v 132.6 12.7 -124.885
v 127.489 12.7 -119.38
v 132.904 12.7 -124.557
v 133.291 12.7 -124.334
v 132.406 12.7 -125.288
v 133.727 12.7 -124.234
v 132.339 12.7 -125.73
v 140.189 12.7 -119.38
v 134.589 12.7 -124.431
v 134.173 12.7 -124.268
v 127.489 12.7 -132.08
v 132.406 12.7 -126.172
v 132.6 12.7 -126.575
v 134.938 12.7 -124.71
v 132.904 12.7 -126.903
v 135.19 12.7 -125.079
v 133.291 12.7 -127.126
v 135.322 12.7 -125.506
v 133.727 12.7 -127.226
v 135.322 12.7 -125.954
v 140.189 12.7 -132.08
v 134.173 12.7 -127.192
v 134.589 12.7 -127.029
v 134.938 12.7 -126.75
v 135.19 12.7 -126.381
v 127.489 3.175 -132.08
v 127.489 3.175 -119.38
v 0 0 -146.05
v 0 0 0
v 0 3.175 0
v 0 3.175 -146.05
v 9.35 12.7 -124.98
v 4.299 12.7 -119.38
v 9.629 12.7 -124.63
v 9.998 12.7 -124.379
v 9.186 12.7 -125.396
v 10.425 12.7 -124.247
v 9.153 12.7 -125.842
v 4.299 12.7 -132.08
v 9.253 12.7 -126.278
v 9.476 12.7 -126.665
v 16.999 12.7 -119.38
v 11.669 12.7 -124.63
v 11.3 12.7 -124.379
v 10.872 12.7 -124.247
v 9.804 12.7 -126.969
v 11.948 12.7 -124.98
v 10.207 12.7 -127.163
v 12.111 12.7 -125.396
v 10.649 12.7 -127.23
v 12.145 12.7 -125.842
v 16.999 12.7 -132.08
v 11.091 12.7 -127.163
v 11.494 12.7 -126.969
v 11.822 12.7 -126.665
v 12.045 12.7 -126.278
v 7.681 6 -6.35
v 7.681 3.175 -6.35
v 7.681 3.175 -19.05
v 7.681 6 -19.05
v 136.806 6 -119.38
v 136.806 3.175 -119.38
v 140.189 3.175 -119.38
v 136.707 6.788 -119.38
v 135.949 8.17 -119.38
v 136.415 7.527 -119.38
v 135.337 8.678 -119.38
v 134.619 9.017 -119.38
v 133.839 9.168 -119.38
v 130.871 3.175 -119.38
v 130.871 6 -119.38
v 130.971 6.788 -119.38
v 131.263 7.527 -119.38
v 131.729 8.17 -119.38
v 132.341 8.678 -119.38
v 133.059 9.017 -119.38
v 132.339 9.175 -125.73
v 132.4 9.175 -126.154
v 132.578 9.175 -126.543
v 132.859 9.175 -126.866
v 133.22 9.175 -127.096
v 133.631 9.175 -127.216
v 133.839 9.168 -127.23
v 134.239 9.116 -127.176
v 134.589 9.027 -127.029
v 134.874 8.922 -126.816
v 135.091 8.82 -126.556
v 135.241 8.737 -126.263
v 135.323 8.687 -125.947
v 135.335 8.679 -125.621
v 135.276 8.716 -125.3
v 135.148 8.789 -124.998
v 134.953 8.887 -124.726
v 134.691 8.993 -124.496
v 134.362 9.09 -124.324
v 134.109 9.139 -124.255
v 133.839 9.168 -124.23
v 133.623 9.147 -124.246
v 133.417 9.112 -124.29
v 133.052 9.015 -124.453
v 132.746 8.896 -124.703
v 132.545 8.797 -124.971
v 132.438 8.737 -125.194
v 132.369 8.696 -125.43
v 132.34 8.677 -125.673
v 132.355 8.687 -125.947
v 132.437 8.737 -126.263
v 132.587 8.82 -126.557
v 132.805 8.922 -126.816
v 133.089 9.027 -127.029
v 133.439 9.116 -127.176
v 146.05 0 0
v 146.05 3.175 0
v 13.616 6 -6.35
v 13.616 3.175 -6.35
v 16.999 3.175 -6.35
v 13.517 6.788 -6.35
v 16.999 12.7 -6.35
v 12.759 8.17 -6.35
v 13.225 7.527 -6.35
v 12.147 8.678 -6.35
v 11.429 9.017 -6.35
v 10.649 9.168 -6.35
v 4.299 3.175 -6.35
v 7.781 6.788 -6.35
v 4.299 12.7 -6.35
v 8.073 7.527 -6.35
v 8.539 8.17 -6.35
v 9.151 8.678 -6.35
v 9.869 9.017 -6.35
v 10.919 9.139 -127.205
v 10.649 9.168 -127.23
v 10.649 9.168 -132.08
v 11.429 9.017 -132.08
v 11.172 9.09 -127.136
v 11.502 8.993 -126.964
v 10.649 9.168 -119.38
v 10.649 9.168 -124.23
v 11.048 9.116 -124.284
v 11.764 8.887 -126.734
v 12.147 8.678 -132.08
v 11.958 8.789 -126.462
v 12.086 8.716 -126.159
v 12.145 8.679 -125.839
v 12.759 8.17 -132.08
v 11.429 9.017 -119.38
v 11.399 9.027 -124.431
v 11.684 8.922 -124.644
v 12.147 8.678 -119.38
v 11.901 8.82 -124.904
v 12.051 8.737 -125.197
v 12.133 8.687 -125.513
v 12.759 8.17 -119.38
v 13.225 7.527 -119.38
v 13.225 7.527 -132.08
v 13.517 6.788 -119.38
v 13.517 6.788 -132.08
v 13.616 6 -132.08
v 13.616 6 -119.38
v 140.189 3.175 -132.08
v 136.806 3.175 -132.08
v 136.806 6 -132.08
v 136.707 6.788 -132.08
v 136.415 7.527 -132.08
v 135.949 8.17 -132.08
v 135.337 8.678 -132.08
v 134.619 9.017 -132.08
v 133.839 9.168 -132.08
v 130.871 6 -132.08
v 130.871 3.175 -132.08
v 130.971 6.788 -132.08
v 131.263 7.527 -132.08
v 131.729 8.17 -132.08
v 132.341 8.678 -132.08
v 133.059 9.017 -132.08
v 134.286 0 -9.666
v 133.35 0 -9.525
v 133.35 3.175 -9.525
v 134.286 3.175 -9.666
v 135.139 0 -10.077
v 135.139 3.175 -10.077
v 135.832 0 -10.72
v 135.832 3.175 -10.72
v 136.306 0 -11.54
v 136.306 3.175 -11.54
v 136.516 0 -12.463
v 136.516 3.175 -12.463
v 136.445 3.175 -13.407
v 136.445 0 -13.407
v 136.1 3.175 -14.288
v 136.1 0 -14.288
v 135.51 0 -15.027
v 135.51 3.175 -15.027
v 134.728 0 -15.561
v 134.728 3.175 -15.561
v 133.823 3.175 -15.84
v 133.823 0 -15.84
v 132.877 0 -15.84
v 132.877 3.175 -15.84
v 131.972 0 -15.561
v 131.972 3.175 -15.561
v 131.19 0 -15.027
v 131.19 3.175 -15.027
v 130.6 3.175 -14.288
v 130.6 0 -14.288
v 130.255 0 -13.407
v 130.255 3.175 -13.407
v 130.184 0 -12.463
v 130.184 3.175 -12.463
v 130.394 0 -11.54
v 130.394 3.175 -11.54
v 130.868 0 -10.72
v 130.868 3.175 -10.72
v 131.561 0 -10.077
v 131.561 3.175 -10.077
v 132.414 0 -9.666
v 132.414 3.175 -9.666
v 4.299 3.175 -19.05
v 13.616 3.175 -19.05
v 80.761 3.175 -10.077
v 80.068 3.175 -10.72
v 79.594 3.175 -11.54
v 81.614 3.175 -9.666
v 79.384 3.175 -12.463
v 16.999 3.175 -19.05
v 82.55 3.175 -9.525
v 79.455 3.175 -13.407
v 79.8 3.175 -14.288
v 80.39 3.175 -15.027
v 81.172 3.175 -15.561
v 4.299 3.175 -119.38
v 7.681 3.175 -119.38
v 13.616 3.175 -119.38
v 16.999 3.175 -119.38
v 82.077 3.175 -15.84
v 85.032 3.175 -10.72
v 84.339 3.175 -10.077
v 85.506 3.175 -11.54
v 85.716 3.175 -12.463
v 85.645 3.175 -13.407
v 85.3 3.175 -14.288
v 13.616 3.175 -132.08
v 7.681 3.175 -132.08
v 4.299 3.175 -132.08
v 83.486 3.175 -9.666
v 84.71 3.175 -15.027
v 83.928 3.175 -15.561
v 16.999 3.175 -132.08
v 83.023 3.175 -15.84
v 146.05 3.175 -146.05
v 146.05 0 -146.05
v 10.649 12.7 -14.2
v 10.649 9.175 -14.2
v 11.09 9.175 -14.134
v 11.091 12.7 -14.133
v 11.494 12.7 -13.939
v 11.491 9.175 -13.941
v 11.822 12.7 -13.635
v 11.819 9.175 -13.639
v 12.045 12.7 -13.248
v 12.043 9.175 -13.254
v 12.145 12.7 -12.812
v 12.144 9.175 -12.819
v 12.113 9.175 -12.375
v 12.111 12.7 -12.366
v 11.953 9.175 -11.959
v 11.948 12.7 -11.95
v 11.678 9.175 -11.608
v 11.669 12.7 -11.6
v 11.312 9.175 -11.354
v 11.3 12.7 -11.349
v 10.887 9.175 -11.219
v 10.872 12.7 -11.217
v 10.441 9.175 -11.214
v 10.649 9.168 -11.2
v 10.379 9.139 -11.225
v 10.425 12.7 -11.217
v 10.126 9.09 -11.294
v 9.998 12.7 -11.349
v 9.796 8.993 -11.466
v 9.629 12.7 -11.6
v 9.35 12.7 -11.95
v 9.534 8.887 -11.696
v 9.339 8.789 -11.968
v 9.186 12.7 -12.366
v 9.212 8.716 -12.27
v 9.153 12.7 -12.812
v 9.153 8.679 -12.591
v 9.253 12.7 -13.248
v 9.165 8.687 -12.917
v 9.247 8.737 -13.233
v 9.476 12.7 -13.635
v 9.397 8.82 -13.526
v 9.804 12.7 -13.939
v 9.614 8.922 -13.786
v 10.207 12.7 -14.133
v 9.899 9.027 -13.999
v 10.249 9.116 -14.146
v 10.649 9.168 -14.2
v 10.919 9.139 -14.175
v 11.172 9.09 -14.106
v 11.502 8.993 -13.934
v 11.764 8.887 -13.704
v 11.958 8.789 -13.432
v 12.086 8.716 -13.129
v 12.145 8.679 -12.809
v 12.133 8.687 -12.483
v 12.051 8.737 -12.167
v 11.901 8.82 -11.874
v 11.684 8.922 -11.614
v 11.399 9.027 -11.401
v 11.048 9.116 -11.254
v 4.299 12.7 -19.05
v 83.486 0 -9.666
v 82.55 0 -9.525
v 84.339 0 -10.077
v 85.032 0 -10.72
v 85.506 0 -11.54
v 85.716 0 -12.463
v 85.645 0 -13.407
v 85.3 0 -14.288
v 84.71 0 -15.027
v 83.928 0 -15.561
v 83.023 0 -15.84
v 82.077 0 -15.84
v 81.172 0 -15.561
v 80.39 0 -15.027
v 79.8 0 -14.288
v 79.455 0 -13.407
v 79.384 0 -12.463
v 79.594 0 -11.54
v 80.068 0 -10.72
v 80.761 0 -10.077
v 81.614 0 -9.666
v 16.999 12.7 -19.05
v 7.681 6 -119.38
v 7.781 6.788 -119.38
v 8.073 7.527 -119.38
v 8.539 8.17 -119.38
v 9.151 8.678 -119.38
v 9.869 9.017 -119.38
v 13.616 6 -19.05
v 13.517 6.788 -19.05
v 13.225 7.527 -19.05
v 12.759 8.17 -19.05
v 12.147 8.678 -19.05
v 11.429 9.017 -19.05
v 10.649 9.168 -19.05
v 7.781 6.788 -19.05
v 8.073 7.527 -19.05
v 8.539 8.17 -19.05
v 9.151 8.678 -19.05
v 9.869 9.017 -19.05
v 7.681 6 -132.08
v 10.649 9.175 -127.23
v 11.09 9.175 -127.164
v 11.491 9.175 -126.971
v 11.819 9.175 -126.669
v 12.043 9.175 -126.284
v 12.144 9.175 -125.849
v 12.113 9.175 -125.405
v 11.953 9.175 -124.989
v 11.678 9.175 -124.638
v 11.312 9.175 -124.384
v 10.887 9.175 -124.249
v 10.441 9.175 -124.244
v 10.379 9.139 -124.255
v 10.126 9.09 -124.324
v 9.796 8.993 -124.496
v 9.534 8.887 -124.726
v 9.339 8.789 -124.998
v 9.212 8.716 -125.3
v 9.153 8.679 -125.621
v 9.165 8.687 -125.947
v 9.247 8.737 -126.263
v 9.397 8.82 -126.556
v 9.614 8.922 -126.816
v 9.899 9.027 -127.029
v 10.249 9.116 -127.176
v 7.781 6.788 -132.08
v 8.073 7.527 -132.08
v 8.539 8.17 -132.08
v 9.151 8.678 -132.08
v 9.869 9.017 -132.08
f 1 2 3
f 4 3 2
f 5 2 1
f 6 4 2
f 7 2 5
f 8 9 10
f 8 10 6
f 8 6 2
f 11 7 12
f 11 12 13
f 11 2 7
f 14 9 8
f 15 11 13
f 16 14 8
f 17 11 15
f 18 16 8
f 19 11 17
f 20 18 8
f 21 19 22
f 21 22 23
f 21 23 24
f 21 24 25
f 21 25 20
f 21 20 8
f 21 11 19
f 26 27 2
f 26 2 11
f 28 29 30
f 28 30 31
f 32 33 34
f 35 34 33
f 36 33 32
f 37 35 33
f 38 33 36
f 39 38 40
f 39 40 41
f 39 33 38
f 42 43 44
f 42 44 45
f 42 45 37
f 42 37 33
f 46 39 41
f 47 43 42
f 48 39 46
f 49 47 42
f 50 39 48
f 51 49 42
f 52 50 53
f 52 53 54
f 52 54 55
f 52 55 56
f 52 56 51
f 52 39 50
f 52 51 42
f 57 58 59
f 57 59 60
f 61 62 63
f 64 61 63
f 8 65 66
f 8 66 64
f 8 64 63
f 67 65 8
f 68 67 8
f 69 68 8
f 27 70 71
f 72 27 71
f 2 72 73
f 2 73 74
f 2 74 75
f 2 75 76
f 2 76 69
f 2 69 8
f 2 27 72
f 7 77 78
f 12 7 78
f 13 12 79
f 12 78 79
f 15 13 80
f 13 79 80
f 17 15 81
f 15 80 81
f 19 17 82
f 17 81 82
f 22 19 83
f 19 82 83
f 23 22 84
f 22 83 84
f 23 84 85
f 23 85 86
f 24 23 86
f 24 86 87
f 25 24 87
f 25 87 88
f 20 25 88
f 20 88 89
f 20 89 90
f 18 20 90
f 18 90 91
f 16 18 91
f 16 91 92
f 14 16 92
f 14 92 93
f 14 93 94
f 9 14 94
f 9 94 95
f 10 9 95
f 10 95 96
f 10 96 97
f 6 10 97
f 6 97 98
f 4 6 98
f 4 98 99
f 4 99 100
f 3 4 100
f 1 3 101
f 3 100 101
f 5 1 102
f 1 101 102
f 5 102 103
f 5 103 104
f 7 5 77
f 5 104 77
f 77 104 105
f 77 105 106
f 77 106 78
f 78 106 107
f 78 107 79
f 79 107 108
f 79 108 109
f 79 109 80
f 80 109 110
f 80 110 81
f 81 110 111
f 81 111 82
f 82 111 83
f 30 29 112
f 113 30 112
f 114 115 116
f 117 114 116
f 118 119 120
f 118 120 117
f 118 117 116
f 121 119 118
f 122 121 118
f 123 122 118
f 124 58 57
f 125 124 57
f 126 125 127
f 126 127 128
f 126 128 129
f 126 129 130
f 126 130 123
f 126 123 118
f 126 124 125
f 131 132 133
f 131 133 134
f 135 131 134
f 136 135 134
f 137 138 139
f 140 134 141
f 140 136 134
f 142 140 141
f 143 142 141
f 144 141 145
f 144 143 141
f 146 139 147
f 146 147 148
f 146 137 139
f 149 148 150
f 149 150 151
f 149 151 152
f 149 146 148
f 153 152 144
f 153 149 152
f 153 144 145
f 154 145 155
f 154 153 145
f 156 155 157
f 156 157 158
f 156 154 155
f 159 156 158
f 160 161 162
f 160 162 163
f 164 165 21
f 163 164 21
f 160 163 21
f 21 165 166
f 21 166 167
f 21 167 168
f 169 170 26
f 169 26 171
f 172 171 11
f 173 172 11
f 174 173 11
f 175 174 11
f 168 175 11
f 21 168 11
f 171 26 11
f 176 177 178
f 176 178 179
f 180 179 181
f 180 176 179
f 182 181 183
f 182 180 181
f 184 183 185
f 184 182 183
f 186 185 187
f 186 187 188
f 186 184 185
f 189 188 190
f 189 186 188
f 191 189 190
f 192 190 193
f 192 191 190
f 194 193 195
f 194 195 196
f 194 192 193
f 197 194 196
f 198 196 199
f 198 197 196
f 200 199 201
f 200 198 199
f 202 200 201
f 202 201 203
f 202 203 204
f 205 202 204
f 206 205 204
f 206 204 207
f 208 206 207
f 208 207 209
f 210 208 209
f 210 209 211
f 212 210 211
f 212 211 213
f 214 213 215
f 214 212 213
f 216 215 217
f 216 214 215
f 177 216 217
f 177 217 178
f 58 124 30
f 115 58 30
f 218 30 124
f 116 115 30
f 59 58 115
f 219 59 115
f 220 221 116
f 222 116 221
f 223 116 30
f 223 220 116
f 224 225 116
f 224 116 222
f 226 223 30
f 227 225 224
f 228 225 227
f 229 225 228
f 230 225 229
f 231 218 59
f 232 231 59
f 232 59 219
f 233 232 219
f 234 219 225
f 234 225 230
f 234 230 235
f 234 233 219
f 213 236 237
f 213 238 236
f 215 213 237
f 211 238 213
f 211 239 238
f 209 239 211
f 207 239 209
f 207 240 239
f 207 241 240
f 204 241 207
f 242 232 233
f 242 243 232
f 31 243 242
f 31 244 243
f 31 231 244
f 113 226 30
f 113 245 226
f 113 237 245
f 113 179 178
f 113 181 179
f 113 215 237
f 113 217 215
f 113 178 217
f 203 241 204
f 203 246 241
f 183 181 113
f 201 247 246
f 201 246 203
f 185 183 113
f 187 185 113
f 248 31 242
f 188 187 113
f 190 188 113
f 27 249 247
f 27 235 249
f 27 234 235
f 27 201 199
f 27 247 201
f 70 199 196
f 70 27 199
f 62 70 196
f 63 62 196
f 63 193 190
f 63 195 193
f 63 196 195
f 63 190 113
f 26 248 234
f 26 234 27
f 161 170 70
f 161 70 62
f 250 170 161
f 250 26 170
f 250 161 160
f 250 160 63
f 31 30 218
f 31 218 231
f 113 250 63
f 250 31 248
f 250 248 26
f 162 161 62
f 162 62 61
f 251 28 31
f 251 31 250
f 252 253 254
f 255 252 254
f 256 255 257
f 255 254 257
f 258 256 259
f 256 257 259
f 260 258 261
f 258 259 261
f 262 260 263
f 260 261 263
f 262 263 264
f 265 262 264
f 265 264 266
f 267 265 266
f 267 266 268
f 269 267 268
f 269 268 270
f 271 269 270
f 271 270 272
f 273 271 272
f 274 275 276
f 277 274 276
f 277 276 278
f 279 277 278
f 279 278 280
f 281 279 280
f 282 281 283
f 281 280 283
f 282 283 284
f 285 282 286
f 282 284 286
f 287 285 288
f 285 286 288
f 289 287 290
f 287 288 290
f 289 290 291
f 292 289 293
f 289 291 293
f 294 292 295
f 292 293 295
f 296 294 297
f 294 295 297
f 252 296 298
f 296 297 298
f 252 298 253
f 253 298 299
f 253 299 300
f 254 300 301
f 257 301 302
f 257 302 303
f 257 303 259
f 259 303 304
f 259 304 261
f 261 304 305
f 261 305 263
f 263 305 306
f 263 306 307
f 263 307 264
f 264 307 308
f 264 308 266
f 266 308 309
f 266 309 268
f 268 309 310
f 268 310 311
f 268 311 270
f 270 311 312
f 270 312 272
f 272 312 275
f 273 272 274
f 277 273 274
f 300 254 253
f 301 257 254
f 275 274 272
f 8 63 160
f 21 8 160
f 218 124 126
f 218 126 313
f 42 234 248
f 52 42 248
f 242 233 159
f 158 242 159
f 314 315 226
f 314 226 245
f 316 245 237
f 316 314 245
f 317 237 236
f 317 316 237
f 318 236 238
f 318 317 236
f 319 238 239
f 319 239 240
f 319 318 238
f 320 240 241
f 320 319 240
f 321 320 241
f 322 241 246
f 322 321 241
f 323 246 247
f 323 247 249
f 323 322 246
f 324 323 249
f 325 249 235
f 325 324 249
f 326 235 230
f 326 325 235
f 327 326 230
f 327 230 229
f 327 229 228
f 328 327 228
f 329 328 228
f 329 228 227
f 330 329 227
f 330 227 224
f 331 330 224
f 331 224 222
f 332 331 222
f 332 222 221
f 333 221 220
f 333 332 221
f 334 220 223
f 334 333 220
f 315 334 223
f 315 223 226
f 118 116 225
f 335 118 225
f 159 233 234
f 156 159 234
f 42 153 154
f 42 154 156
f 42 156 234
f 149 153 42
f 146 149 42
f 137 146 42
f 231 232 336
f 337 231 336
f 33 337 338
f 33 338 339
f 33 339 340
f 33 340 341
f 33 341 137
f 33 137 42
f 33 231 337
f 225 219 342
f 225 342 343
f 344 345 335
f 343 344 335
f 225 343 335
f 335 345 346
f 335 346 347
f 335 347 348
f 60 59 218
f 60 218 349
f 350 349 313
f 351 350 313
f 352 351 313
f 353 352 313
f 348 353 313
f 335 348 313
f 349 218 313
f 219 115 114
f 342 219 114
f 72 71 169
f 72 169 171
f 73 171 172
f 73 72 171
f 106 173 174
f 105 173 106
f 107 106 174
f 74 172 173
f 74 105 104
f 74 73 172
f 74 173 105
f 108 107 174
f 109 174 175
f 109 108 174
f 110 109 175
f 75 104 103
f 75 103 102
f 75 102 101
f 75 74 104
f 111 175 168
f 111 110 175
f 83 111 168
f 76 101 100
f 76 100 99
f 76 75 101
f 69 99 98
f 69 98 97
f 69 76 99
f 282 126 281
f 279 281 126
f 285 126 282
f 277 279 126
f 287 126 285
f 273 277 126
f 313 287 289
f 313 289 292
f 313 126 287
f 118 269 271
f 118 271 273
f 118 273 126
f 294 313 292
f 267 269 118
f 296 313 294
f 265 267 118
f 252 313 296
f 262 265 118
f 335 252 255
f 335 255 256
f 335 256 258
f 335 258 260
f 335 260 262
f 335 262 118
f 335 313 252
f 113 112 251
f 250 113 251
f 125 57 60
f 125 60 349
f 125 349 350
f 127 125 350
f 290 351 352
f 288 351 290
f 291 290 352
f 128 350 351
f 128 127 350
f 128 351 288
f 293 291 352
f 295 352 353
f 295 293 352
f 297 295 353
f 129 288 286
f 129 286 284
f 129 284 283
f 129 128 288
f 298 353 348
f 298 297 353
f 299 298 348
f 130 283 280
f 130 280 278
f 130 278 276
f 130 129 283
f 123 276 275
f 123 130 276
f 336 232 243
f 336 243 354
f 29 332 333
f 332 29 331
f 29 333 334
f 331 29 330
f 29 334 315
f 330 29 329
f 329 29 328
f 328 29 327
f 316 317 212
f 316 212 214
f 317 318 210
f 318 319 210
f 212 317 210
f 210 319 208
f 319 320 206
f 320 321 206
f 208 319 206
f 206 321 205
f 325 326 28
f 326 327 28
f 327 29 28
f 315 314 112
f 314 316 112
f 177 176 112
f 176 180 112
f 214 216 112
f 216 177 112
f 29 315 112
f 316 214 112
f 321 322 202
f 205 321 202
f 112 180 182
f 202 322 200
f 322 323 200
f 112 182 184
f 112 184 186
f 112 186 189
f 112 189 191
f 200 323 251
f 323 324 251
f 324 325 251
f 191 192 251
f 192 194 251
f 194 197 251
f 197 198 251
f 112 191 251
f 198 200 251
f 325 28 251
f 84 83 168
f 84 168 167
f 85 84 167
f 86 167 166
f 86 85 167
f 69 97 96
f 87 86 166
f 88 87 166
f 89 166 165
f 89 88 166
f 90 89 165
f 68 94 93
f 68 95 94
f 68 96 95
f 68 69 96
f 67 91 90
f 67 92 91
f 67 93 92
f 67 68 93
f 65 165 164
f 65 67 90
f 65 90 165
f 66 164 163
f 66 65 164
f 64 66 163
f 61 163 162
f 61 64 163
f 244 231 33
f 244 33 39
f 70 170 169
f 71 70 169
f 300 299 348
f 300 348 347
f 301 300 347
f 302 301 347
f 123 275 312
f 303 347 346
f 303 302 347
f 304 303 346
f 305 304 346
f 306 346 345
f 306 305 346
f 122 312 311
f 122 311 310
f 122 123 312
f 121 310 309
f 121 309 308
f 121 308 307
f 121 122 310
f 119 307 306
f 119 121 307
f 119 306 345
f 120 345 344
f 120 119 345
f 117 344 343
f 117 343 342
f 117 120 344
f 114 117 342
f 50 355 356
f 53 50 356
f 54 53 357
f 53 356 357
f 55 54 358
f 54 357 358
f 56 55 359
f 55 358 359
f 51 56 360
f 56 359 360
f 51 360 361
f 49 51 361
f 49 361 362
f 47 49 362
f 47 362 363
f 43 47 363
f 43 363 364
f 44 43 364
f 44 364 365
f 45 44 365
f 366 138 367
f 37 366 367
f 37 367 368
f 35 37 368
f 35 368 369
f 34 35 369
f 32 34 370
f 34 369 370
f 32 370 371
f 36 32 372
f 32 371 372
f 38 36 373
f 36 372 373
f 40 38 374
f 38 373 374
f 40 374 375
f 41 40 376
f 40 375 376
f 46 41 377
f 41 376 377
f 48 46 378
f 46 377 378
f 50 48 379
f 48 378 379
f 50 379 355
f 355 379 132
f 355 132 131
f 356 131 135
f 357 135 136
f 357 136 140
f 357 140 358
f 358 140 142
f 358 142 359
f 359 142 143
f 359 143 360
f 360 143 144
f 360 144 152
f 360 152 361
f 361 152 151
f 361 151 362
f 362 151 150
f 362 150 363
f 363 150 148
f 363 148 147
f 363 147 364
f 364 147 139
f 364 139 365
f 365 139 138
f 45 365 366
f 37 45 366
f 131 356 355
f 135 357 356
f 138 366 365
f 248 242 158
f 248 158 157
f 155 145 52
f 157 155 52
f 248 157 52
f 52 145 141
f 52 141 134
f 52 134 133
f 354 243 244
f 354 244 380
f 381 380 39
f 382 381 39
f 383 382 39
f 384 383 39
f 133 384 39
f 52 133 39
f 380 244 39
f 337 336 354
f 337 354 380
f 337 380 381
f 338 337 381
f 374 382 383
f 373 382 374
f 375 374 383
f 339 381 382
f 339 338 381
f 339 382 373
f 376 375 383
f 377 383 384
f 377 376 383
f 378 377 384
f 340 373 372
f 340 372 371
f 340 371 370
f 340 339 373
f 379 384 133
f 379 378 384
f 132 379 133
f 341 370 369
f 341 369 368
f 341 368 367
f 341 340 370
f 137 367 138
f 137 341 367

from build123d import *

# Parameters (mm, degrees)
SKETCH1_W           = 146.05
SKETCH1_H           = 146.05
SKETCH1_R           = 3.175
BOSS_EXTRUDE1_DEPTH = 3.175
SKETCH4_W           = 12.7
SKETCH4_H           = 12.7
BOSS_EXTRUDE4_DEPTH = 9.525
SKETCH6_W           = 5.935
SKETCH6_H           = 6
CUT_EXTRUDE2_DEPTH  = 150
SKETCH7_W           = 5.935
SKETCH7_H           = 6
CUT_EXTRUDE3_DEPTH  = 15
SKETCH2_R           = 1.5
CUT_EXTRUDE4_DEPTH  = 15
FILLET2_R           = 3.175


with BuildPart() as part:
    # Sketch1 → Boss-Extrude1 (new body)
    with BuildSketch(Plane(origin=(0, 0, 0), x_dir=(1, 0, 0), z_dir=(0, 1, 0))):
        with Locations((73.025, 73.025)):
            Rectangle(SKETCH1_W, SKETCH1_H)
        with Locations(Location((133.35, 12.7, 0), (0, 0, 270))):
            Circle(SKETCH1_R, mode=Mode.SUBTRACT)
        with Locations(Location((82.55, 12.7, 0), (0, 0, 270))):
            Circle(SKETCH1_R, mode=Mode.SUBTRACT)
    extrude(amount=BOSS_EXTRUDE1_DEPTH)

    # Sketch4 → Boss-Extrude4 (add)
    with BuildSketch(Plane(origin=(0, 3.175, 0), x_dir=(1, 0, 0), z_dir=(0, 1, 0))):
        with Locations((10.648879027, 12.7)):
            Rectangle(SKETCH4_W, SKETCH4_H)
        with Locations((10.648879027, 125.73)):
            Rectangle(SKETCH4_W, SKETCH4_H)
        with Locations((133.838879027, 125.73)):
            Rectangle(SKETCH4_W, SKETCH4_H)
    extrude(amount=BOSS_EXTRUDE4_DEPTH)

    # Sketch6 → Cut-Extrude2 (cut)
    with BuildSketch(Plane.XY.offset(-6.35)):
        with Locations((10.648879027, 6.175)):
            Rectangle(SKETCH6_W, SKETCH6_H)
    extrude(amount=-CUT_EXTRUDE2_DEPTH, mode=Mode.SUBTRACT)

    # Sketch7 → Cut-Extrude3 (cut)
    with BuildSketch(Plane.XY.offset(-119.38)):
        with Locations((133.838879027, 6.175)):
            Rectangle(SKETCH7_W, SKETCH7_H)
    extrude(amount=-CUT_EXTRUDE3_DEPTH, mode=Mode.SUBTRACT)

    # Sketch2 → Cut-Extrude4 (cut)
    with BuildSketch(Plane(origin=(0, 3.175, 0), x_dir=(1, 0, 0), z_dir=(0, 1, 0))):
        with Locations(Location((10.648879027, 125.73, 0), (0, 0, 90))):
            Circle(SKETCH2_R)
        with Locations(Location((133.838879027, 125.73, 0), (0, 0, 180))):
            Circle(SKETCH2_R)
        with Locations(Location((10.648879027, 12.7, 0), (0, 0, 90))):
            Circle(SKETCH2_R)
    extrude(amount=CUT_EXTRUDE4_DEPTH, mode=Mode.SUBTRACT)

    # Fillet2
    # the kernel refuses this fillet: 3.175 mm, written as the material it adds along each edge
    with BuildSketch(Plane(origin=(136.806379027, 9.175, -119.38), x_dir=(0, -1, 0), z_dir=(0, 0, -1))) as fillet2_piece_1_section:
        with BuildLine():
            CenterArc((FILLET2_R, FILLET2_R), FILLET2_R, 180, 90)
            Line((0, FILLET2_R), (0, 0))
            Line((0, 0), (FILLET2_R, 0))
        make_face()
    fillet2_piece_1 = extrude(amount=12.7, mode=Mode.PRIVATE)
    fillet2_piece_1 = fillet2_piece_1 - Plane(origin=(133.838879027, 8.440537645, -125.73), x_dir=(-1, 0, 0), z_dir=(0, -1, 0)) * Cylinder(1.5, 39, mode=Mode.PRIVATE)
    add(fillet2_piece_1)
    with BuildSketch(Plane(origin=(130.871379027, 9.175, -119.38), x_dir=(0, -1, 0), z_dir=(0, 0, -1))) as fillet2_piece_2_section:
        with BuildLine():
            CenterArc((FILLET2_R, -FILLET2_R), FILLET2_R, 90, 90)
            Line((0, -FILLET2_R), (0, 0))
            Line((0, 0), (FILLET2_R, 0))
        make_face()
    fillet2_piece_2 = extrude(amount=12.7, mode=Mode.PRIVATE)
    fillet2_piece_2 = fillet2_piece_2 - Plane(origin=(133.838879027, 8.44053751, -125.73), x_dir=(-1, 0, 0), z_dir=(0, -1, 0)) * Cylinder(1.5, 39, mode=Mode.PRIVATE)
    add(fillet2_piece_2)
    with BuildSketch(Plane(origin=(13.616379027, 9.175, -119.38), x_dir=(0, -1, 0), z_dir=(0, 0, -1))) as fillet2_piece_3_section:
        with BuildLine():
            CenterArc((FILLET2_R, FILLET2_R), FILLET2_R, 180, 90)
            Line((0, FILLET2_R), (0, 0))
            Line((0, 0), (FILLET2_R, 0))
        make_face()
    fillet2_piece_3 = extrude(amount=12.7, mode=Mode.PRIVATE)
    fillet2_piece_3 = fillet2_piece_3 - Plane(origin=(10.648879027, 8.440537543, -125.73), x_dir=(0, 0, -1), z_dir=(0, -1, 0)) * Cylinder(1.5, 39, mode=Mode.PRIVATE)
    add(fillet2_piece_3)
    with BuildSketch(Plane(origin=(7.681379027, 9.175, -119.38), x_dir=(0, -1, 0), z_dir=(0, 0, -1))) as fillet2_piece_4_section:
        with BuildLine():
            CenterArc((FILLET2_R, -FILLET2_R), FILLET2_R, 90, 90)
            Line((0, -FILLET2_R), (0, 0))
            Line((0, 0), (FILLET2_R, 0))
        make_face()
    fillet2_piece_4 = extrude(amount=12.7, mode=Mode.PRIVATE)
    fillet2_piece_4 = fillet2_piece_4 - Plane(origin=(10.648879027, 8.440537622, -125.73), x_dir=(0, 0, -1), z_dir=(0, -1, 0)) * Cylinder(1.5, 39, mode=Mode.PRIVATE)
    add(fillet2_piece_4)
    with BuildSketch(Plane(origin=(13.616379027, 9.175, -6.35), x_dir=(0, -1, 0), z_dir=(0, 0, -1))) as fillet2_piece_5_section:
        with BuildLine():
            CenterArc((FILLET2_R, FILLET2_R), FILLET2_R, 180, 90)
            Line((0, FILLET2_R), (0, 0))
            Line((0, 0), (FILLET2_R, 0))
        make_face()
    fillet2_piece_5 = extrude(amount=12.7, mode=Mode.PRIVATE)
    fillet2_piece_5 = fillet2_piece_5 - Plane(origin=(10.648879027, 8.440537543, -12.7), x_dir=(0, 0, -1), z_dir=(0, -1, 0)) * Cylinder(1.5, 39, mode=Mode.PRIVATE)
    add(fillet2_piece_5)
    with BuildSketch(Plane(origin=(7.681379027, 9.175, -6.35), x_dir=(0, -1, 0), z_dir=(0, 0, -1))) as fillet2_piece_6_section:
        with BuildLine():
            CenterArc((FILLET2_R, -FILLET2_R), FILLET2_R, 90, 90)
            Line((0, -FILLET2_R), (0, 0))
            Line((0, 0), (FILLET2_R, 0))
        make_face()
    fillet2_piece_6 = extrude(amount=12.7, mode=Mode.PRIVATE)
    fillet2_piece_6 = fillet2_piece_6 - Plane(origin=(10.648879027, 8.440537622, -12.7), x_dir=(0, 0, -1), z_dir=(0, -1, 0)) * Cylinder(1.5, 39, mode=Mode.PRIVATE)
    add(fillet2_piece_6)


solid = part.part
